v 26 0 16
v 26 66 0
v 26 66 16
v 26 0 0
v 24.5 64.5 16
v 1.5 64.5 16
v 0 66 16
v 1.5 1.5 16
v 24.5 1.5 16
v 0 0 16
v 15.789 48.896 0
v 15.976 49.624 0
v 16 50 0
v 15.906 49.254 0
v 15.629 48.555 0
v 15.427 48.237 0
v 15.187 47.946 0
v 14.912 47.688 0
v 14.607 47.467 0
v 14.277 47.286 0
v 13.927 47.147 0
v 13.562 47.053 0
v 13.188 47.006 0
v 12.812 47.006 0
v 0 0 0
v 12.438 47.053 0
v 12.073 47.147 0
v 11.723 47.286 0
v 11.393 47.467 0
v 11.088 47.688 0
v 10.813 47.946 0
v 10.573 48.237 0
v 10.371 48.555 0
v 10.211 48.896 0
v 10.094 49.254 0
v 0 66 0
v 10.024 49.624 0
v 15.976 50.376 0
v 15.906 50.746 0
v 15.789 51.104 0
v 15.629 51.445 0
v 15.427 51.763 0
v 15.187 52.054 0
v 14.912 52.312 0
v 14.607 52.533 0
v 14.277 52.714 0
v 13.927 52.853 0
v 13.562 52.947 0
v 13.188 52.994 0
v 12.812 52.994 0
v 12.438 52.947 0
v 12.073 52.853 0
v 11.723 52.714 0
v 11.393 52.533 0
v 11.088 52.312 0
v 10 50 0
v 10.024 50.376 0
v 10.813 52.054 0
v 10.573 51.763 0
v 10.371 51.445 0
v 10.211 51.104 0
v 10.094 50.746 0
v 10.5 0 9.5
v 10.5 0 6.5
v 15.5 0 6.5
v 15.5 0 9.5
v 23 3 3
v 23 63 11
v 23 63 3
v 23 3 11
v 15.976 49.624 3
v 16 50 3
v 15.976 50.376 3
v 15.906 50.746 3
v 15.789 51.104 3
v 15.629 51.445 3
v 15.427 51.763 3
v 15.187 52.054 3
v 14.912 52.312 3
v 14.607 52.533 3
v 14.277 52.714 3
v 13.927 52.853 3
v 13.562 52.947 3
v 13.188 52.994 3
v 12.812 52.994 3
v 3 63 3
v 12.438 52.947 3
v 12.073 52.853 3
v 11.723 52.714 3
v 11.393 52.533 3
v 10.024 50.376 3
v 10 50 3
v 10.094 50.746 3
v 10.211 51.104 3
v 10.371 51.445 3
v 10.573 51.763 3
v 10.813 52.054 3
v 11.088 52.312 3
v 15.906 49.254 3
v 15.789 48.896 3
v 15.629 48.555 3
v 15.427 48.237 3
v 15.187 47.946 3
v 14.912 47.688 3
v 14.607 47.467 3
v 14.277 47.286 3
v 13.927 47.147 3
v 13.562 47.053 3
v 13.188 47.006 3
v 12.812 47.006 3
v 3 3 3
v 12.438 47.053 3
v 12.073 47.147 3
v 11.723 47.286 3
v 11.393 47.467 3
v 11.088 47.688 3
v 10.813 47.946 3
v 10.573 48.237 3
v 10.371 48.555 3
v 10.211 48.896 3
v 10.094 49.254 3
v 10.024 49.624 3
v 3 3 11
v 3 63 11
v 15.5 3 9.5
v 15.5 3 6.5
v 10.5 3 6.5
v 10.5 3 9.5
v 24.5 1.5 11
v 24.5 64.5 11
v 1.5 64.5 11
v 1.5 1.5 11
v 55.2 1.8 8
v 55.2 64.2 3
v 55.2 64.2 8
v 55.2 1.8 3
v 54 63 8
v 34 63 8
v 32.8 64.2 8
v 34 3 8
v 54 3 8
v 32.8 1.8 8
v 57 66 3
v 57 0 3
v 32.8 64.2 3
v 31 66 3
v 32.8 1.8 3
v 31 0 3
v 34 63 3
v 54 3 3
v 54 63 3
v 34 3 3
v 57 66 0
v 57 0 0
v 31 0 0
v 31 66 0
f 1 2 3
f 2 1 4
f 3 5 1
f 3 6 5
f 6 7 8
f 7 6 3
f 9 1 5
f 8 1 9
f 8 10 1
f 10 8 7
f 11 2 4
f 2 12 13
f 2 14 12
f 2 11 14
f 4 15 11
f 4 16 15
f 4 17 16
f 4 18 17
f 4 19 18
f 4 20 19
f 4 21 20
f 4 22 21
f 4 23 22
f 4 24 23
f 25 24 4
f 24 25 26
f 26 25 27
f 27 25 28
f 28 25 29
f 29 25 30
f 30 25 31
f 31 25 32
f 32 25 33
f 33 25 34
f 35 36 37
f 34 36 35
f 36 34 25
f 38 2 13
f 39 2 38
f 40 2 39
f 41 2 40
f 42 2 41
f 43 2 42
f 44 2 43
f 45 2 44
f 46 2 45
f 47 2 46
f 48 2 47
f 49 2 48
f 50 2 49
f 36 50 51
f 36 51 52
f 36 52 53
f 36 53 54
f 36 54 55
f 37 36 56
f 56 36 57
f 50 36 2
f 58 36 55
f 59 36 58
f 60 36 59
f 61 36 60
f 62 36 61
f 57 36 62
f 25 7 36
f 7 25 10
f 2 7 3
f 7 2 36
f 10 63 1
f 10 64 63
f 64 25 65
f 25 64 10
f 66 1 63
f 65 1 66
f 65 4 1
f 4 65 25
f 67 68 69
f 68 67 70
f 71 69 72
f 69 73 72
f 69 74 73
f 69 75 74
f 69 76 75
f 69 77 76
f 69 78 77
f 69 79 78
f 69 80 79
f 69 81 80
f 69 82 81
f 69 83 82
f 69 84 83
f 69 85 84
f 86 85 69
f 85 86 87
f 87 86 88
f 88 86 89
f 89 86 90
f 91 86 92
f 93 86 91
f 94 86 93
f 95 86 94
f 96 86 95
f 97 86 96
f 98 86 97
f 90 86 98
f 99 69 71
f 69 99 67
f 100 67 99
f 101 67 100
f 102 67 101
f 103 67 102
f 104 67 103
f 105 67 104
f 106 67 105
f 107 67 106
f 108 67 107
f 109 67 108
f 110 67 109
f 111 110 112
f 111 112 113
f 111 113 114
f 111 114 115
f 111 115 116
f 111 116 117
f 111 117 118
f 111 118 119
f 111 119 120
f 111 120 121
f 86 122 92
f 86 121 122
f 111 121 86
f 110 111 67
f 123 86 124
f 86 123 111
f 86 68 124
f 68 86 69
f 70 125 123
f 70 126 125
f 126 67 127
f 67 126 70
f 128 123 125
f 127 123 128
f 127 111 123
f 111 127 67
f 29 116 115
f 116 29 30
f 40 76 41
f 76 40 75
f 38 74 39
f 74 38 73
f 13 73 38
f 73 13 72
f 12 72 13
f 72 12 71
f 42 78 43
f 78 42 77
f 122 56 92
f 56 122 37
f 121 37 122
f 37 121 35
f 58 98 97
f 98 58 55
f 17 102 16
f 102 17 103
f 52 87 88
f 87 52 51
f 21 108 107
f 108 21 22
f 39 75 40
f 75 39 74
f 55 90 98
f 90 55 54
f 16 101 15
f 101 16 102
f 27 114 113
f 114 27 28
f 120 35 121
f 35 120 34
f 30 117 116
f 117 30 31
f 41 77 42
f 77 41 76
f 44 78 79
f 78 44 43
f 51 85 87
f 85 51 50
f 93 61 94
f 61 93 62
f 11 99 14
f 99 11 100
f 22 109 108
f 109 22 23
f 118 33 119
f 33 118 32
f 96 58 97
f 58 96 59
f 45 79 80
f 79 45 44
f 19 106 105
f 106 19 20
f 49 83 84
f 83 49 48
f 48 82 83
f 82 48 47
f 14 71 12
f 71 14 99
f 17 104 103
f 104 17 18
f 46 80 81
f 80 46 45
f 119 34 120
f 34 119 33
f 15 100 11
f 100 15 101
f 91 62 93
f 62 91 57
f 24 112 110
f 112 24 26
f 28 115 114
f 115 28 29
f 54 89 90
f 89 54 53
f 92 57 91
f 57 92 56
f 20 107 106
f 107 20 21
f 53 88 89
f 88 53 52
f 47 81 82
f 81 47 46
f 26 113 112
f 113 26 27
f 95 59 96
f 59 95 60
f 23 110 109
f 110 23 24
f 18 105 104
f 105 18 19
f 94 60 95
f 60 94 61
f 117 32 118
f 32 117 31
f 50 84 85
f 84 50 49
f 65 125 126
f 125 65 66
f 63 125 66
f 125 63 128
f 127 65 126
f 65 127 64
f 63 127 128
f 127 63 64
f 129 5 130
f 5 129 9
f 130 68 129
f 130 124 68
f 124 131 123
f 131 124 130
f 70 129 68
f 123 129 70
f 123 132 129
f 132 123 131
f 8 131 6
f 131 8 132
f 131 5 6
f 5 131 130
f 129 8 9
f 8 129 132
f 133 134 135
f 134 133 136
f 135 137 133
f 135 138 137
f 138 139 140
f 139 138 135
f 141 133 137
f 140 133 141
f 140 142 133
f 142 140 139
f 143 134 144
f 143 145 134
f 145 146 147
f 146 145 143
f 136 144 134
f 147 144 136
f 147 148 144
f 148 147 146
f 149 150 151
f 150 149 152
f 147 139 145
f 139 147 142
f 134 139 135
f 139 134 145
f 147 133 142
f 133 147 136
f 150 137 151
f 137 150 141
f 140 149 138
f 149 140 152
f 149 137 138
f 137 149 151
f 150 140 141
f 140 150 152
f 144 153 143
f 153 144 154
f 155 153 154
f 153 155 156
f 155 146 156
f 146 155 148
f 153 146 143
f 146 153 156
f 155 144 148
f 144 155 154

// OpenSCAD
$fn=50;
e=0.1;

thickness = 3;

inner_width = 20;
inner_depth = 60;
inner_height = 10;

sensor_r = 3;
sensor_center_x = (inner_width + thickness*2) / 2;
sensor_center_y = inner_depth - 10;

usb_hole_width = 5;
usb_hole_height = 3;
usb_hole_x = ((inner_width + thickness*2) / 2) - (usb_hole_width / 2);
usb_hole_z = ((inner_height + thickness*2) / 2) - (usb_hole_height / 2);

lid_connection_height = 5;
lid_mating_gap = 0.3;



box();

translate([inner_width + thickness * 2 + 5, 0, 0])
    lid();
     


     
module box() {

    difference() {
        cube([inner_width + thickness*2,
            inner_depth + thickness*2,
            inner_height + thickness*2]);
        
        // Inner cube
        translate([thickness, thickness, thickness])
            cube([inner_width, inner_depth, inner_height+thickness+e]);
        
        // Sensor hole
        translate([sensor_center_x, sensor_center_y, 0])
            cylinder(thickness+e, r=sensor_r);
        
        // ESP USB hole
        translate([usb_hole_x, -e, usb_hole_z])
            cube([usb_hole_width, thickness+2*e, usb_hole_height]);
        
        // Lid
        translate([thickness / 2, thickness / 2, (inner_height + thickness * 2) - lid_connection_height])
            cube([inner_width+thickness, inner_depth+thickness, lid_connection_height+e]);
    }    
    
}

module lid() {
    // base
    cube([inner_width + thickness * 2,
          inner_depth + thickness * 2,
          thickness]);
    
    // mating portion
    translate([thickness / 2 + lid_mating_gap,
               thickness / 2 + lid_mating_gap,
               thickness])
    {
        difference() {
            cube([inner_width + (thickness / 2 - lid_mating_gap) * 2,
                inner_depth + (thickness / 2 - lid_mating_gap) * 2,
                lid_connection_height]);
            
            translate([thickness / 2 - lid_mating_gap,
                       thickness / 2 - lid_mating_gap,
                       0])
                cube([inner_width, inner_depth, lid_connection_height+e]);
        }
    }
}
